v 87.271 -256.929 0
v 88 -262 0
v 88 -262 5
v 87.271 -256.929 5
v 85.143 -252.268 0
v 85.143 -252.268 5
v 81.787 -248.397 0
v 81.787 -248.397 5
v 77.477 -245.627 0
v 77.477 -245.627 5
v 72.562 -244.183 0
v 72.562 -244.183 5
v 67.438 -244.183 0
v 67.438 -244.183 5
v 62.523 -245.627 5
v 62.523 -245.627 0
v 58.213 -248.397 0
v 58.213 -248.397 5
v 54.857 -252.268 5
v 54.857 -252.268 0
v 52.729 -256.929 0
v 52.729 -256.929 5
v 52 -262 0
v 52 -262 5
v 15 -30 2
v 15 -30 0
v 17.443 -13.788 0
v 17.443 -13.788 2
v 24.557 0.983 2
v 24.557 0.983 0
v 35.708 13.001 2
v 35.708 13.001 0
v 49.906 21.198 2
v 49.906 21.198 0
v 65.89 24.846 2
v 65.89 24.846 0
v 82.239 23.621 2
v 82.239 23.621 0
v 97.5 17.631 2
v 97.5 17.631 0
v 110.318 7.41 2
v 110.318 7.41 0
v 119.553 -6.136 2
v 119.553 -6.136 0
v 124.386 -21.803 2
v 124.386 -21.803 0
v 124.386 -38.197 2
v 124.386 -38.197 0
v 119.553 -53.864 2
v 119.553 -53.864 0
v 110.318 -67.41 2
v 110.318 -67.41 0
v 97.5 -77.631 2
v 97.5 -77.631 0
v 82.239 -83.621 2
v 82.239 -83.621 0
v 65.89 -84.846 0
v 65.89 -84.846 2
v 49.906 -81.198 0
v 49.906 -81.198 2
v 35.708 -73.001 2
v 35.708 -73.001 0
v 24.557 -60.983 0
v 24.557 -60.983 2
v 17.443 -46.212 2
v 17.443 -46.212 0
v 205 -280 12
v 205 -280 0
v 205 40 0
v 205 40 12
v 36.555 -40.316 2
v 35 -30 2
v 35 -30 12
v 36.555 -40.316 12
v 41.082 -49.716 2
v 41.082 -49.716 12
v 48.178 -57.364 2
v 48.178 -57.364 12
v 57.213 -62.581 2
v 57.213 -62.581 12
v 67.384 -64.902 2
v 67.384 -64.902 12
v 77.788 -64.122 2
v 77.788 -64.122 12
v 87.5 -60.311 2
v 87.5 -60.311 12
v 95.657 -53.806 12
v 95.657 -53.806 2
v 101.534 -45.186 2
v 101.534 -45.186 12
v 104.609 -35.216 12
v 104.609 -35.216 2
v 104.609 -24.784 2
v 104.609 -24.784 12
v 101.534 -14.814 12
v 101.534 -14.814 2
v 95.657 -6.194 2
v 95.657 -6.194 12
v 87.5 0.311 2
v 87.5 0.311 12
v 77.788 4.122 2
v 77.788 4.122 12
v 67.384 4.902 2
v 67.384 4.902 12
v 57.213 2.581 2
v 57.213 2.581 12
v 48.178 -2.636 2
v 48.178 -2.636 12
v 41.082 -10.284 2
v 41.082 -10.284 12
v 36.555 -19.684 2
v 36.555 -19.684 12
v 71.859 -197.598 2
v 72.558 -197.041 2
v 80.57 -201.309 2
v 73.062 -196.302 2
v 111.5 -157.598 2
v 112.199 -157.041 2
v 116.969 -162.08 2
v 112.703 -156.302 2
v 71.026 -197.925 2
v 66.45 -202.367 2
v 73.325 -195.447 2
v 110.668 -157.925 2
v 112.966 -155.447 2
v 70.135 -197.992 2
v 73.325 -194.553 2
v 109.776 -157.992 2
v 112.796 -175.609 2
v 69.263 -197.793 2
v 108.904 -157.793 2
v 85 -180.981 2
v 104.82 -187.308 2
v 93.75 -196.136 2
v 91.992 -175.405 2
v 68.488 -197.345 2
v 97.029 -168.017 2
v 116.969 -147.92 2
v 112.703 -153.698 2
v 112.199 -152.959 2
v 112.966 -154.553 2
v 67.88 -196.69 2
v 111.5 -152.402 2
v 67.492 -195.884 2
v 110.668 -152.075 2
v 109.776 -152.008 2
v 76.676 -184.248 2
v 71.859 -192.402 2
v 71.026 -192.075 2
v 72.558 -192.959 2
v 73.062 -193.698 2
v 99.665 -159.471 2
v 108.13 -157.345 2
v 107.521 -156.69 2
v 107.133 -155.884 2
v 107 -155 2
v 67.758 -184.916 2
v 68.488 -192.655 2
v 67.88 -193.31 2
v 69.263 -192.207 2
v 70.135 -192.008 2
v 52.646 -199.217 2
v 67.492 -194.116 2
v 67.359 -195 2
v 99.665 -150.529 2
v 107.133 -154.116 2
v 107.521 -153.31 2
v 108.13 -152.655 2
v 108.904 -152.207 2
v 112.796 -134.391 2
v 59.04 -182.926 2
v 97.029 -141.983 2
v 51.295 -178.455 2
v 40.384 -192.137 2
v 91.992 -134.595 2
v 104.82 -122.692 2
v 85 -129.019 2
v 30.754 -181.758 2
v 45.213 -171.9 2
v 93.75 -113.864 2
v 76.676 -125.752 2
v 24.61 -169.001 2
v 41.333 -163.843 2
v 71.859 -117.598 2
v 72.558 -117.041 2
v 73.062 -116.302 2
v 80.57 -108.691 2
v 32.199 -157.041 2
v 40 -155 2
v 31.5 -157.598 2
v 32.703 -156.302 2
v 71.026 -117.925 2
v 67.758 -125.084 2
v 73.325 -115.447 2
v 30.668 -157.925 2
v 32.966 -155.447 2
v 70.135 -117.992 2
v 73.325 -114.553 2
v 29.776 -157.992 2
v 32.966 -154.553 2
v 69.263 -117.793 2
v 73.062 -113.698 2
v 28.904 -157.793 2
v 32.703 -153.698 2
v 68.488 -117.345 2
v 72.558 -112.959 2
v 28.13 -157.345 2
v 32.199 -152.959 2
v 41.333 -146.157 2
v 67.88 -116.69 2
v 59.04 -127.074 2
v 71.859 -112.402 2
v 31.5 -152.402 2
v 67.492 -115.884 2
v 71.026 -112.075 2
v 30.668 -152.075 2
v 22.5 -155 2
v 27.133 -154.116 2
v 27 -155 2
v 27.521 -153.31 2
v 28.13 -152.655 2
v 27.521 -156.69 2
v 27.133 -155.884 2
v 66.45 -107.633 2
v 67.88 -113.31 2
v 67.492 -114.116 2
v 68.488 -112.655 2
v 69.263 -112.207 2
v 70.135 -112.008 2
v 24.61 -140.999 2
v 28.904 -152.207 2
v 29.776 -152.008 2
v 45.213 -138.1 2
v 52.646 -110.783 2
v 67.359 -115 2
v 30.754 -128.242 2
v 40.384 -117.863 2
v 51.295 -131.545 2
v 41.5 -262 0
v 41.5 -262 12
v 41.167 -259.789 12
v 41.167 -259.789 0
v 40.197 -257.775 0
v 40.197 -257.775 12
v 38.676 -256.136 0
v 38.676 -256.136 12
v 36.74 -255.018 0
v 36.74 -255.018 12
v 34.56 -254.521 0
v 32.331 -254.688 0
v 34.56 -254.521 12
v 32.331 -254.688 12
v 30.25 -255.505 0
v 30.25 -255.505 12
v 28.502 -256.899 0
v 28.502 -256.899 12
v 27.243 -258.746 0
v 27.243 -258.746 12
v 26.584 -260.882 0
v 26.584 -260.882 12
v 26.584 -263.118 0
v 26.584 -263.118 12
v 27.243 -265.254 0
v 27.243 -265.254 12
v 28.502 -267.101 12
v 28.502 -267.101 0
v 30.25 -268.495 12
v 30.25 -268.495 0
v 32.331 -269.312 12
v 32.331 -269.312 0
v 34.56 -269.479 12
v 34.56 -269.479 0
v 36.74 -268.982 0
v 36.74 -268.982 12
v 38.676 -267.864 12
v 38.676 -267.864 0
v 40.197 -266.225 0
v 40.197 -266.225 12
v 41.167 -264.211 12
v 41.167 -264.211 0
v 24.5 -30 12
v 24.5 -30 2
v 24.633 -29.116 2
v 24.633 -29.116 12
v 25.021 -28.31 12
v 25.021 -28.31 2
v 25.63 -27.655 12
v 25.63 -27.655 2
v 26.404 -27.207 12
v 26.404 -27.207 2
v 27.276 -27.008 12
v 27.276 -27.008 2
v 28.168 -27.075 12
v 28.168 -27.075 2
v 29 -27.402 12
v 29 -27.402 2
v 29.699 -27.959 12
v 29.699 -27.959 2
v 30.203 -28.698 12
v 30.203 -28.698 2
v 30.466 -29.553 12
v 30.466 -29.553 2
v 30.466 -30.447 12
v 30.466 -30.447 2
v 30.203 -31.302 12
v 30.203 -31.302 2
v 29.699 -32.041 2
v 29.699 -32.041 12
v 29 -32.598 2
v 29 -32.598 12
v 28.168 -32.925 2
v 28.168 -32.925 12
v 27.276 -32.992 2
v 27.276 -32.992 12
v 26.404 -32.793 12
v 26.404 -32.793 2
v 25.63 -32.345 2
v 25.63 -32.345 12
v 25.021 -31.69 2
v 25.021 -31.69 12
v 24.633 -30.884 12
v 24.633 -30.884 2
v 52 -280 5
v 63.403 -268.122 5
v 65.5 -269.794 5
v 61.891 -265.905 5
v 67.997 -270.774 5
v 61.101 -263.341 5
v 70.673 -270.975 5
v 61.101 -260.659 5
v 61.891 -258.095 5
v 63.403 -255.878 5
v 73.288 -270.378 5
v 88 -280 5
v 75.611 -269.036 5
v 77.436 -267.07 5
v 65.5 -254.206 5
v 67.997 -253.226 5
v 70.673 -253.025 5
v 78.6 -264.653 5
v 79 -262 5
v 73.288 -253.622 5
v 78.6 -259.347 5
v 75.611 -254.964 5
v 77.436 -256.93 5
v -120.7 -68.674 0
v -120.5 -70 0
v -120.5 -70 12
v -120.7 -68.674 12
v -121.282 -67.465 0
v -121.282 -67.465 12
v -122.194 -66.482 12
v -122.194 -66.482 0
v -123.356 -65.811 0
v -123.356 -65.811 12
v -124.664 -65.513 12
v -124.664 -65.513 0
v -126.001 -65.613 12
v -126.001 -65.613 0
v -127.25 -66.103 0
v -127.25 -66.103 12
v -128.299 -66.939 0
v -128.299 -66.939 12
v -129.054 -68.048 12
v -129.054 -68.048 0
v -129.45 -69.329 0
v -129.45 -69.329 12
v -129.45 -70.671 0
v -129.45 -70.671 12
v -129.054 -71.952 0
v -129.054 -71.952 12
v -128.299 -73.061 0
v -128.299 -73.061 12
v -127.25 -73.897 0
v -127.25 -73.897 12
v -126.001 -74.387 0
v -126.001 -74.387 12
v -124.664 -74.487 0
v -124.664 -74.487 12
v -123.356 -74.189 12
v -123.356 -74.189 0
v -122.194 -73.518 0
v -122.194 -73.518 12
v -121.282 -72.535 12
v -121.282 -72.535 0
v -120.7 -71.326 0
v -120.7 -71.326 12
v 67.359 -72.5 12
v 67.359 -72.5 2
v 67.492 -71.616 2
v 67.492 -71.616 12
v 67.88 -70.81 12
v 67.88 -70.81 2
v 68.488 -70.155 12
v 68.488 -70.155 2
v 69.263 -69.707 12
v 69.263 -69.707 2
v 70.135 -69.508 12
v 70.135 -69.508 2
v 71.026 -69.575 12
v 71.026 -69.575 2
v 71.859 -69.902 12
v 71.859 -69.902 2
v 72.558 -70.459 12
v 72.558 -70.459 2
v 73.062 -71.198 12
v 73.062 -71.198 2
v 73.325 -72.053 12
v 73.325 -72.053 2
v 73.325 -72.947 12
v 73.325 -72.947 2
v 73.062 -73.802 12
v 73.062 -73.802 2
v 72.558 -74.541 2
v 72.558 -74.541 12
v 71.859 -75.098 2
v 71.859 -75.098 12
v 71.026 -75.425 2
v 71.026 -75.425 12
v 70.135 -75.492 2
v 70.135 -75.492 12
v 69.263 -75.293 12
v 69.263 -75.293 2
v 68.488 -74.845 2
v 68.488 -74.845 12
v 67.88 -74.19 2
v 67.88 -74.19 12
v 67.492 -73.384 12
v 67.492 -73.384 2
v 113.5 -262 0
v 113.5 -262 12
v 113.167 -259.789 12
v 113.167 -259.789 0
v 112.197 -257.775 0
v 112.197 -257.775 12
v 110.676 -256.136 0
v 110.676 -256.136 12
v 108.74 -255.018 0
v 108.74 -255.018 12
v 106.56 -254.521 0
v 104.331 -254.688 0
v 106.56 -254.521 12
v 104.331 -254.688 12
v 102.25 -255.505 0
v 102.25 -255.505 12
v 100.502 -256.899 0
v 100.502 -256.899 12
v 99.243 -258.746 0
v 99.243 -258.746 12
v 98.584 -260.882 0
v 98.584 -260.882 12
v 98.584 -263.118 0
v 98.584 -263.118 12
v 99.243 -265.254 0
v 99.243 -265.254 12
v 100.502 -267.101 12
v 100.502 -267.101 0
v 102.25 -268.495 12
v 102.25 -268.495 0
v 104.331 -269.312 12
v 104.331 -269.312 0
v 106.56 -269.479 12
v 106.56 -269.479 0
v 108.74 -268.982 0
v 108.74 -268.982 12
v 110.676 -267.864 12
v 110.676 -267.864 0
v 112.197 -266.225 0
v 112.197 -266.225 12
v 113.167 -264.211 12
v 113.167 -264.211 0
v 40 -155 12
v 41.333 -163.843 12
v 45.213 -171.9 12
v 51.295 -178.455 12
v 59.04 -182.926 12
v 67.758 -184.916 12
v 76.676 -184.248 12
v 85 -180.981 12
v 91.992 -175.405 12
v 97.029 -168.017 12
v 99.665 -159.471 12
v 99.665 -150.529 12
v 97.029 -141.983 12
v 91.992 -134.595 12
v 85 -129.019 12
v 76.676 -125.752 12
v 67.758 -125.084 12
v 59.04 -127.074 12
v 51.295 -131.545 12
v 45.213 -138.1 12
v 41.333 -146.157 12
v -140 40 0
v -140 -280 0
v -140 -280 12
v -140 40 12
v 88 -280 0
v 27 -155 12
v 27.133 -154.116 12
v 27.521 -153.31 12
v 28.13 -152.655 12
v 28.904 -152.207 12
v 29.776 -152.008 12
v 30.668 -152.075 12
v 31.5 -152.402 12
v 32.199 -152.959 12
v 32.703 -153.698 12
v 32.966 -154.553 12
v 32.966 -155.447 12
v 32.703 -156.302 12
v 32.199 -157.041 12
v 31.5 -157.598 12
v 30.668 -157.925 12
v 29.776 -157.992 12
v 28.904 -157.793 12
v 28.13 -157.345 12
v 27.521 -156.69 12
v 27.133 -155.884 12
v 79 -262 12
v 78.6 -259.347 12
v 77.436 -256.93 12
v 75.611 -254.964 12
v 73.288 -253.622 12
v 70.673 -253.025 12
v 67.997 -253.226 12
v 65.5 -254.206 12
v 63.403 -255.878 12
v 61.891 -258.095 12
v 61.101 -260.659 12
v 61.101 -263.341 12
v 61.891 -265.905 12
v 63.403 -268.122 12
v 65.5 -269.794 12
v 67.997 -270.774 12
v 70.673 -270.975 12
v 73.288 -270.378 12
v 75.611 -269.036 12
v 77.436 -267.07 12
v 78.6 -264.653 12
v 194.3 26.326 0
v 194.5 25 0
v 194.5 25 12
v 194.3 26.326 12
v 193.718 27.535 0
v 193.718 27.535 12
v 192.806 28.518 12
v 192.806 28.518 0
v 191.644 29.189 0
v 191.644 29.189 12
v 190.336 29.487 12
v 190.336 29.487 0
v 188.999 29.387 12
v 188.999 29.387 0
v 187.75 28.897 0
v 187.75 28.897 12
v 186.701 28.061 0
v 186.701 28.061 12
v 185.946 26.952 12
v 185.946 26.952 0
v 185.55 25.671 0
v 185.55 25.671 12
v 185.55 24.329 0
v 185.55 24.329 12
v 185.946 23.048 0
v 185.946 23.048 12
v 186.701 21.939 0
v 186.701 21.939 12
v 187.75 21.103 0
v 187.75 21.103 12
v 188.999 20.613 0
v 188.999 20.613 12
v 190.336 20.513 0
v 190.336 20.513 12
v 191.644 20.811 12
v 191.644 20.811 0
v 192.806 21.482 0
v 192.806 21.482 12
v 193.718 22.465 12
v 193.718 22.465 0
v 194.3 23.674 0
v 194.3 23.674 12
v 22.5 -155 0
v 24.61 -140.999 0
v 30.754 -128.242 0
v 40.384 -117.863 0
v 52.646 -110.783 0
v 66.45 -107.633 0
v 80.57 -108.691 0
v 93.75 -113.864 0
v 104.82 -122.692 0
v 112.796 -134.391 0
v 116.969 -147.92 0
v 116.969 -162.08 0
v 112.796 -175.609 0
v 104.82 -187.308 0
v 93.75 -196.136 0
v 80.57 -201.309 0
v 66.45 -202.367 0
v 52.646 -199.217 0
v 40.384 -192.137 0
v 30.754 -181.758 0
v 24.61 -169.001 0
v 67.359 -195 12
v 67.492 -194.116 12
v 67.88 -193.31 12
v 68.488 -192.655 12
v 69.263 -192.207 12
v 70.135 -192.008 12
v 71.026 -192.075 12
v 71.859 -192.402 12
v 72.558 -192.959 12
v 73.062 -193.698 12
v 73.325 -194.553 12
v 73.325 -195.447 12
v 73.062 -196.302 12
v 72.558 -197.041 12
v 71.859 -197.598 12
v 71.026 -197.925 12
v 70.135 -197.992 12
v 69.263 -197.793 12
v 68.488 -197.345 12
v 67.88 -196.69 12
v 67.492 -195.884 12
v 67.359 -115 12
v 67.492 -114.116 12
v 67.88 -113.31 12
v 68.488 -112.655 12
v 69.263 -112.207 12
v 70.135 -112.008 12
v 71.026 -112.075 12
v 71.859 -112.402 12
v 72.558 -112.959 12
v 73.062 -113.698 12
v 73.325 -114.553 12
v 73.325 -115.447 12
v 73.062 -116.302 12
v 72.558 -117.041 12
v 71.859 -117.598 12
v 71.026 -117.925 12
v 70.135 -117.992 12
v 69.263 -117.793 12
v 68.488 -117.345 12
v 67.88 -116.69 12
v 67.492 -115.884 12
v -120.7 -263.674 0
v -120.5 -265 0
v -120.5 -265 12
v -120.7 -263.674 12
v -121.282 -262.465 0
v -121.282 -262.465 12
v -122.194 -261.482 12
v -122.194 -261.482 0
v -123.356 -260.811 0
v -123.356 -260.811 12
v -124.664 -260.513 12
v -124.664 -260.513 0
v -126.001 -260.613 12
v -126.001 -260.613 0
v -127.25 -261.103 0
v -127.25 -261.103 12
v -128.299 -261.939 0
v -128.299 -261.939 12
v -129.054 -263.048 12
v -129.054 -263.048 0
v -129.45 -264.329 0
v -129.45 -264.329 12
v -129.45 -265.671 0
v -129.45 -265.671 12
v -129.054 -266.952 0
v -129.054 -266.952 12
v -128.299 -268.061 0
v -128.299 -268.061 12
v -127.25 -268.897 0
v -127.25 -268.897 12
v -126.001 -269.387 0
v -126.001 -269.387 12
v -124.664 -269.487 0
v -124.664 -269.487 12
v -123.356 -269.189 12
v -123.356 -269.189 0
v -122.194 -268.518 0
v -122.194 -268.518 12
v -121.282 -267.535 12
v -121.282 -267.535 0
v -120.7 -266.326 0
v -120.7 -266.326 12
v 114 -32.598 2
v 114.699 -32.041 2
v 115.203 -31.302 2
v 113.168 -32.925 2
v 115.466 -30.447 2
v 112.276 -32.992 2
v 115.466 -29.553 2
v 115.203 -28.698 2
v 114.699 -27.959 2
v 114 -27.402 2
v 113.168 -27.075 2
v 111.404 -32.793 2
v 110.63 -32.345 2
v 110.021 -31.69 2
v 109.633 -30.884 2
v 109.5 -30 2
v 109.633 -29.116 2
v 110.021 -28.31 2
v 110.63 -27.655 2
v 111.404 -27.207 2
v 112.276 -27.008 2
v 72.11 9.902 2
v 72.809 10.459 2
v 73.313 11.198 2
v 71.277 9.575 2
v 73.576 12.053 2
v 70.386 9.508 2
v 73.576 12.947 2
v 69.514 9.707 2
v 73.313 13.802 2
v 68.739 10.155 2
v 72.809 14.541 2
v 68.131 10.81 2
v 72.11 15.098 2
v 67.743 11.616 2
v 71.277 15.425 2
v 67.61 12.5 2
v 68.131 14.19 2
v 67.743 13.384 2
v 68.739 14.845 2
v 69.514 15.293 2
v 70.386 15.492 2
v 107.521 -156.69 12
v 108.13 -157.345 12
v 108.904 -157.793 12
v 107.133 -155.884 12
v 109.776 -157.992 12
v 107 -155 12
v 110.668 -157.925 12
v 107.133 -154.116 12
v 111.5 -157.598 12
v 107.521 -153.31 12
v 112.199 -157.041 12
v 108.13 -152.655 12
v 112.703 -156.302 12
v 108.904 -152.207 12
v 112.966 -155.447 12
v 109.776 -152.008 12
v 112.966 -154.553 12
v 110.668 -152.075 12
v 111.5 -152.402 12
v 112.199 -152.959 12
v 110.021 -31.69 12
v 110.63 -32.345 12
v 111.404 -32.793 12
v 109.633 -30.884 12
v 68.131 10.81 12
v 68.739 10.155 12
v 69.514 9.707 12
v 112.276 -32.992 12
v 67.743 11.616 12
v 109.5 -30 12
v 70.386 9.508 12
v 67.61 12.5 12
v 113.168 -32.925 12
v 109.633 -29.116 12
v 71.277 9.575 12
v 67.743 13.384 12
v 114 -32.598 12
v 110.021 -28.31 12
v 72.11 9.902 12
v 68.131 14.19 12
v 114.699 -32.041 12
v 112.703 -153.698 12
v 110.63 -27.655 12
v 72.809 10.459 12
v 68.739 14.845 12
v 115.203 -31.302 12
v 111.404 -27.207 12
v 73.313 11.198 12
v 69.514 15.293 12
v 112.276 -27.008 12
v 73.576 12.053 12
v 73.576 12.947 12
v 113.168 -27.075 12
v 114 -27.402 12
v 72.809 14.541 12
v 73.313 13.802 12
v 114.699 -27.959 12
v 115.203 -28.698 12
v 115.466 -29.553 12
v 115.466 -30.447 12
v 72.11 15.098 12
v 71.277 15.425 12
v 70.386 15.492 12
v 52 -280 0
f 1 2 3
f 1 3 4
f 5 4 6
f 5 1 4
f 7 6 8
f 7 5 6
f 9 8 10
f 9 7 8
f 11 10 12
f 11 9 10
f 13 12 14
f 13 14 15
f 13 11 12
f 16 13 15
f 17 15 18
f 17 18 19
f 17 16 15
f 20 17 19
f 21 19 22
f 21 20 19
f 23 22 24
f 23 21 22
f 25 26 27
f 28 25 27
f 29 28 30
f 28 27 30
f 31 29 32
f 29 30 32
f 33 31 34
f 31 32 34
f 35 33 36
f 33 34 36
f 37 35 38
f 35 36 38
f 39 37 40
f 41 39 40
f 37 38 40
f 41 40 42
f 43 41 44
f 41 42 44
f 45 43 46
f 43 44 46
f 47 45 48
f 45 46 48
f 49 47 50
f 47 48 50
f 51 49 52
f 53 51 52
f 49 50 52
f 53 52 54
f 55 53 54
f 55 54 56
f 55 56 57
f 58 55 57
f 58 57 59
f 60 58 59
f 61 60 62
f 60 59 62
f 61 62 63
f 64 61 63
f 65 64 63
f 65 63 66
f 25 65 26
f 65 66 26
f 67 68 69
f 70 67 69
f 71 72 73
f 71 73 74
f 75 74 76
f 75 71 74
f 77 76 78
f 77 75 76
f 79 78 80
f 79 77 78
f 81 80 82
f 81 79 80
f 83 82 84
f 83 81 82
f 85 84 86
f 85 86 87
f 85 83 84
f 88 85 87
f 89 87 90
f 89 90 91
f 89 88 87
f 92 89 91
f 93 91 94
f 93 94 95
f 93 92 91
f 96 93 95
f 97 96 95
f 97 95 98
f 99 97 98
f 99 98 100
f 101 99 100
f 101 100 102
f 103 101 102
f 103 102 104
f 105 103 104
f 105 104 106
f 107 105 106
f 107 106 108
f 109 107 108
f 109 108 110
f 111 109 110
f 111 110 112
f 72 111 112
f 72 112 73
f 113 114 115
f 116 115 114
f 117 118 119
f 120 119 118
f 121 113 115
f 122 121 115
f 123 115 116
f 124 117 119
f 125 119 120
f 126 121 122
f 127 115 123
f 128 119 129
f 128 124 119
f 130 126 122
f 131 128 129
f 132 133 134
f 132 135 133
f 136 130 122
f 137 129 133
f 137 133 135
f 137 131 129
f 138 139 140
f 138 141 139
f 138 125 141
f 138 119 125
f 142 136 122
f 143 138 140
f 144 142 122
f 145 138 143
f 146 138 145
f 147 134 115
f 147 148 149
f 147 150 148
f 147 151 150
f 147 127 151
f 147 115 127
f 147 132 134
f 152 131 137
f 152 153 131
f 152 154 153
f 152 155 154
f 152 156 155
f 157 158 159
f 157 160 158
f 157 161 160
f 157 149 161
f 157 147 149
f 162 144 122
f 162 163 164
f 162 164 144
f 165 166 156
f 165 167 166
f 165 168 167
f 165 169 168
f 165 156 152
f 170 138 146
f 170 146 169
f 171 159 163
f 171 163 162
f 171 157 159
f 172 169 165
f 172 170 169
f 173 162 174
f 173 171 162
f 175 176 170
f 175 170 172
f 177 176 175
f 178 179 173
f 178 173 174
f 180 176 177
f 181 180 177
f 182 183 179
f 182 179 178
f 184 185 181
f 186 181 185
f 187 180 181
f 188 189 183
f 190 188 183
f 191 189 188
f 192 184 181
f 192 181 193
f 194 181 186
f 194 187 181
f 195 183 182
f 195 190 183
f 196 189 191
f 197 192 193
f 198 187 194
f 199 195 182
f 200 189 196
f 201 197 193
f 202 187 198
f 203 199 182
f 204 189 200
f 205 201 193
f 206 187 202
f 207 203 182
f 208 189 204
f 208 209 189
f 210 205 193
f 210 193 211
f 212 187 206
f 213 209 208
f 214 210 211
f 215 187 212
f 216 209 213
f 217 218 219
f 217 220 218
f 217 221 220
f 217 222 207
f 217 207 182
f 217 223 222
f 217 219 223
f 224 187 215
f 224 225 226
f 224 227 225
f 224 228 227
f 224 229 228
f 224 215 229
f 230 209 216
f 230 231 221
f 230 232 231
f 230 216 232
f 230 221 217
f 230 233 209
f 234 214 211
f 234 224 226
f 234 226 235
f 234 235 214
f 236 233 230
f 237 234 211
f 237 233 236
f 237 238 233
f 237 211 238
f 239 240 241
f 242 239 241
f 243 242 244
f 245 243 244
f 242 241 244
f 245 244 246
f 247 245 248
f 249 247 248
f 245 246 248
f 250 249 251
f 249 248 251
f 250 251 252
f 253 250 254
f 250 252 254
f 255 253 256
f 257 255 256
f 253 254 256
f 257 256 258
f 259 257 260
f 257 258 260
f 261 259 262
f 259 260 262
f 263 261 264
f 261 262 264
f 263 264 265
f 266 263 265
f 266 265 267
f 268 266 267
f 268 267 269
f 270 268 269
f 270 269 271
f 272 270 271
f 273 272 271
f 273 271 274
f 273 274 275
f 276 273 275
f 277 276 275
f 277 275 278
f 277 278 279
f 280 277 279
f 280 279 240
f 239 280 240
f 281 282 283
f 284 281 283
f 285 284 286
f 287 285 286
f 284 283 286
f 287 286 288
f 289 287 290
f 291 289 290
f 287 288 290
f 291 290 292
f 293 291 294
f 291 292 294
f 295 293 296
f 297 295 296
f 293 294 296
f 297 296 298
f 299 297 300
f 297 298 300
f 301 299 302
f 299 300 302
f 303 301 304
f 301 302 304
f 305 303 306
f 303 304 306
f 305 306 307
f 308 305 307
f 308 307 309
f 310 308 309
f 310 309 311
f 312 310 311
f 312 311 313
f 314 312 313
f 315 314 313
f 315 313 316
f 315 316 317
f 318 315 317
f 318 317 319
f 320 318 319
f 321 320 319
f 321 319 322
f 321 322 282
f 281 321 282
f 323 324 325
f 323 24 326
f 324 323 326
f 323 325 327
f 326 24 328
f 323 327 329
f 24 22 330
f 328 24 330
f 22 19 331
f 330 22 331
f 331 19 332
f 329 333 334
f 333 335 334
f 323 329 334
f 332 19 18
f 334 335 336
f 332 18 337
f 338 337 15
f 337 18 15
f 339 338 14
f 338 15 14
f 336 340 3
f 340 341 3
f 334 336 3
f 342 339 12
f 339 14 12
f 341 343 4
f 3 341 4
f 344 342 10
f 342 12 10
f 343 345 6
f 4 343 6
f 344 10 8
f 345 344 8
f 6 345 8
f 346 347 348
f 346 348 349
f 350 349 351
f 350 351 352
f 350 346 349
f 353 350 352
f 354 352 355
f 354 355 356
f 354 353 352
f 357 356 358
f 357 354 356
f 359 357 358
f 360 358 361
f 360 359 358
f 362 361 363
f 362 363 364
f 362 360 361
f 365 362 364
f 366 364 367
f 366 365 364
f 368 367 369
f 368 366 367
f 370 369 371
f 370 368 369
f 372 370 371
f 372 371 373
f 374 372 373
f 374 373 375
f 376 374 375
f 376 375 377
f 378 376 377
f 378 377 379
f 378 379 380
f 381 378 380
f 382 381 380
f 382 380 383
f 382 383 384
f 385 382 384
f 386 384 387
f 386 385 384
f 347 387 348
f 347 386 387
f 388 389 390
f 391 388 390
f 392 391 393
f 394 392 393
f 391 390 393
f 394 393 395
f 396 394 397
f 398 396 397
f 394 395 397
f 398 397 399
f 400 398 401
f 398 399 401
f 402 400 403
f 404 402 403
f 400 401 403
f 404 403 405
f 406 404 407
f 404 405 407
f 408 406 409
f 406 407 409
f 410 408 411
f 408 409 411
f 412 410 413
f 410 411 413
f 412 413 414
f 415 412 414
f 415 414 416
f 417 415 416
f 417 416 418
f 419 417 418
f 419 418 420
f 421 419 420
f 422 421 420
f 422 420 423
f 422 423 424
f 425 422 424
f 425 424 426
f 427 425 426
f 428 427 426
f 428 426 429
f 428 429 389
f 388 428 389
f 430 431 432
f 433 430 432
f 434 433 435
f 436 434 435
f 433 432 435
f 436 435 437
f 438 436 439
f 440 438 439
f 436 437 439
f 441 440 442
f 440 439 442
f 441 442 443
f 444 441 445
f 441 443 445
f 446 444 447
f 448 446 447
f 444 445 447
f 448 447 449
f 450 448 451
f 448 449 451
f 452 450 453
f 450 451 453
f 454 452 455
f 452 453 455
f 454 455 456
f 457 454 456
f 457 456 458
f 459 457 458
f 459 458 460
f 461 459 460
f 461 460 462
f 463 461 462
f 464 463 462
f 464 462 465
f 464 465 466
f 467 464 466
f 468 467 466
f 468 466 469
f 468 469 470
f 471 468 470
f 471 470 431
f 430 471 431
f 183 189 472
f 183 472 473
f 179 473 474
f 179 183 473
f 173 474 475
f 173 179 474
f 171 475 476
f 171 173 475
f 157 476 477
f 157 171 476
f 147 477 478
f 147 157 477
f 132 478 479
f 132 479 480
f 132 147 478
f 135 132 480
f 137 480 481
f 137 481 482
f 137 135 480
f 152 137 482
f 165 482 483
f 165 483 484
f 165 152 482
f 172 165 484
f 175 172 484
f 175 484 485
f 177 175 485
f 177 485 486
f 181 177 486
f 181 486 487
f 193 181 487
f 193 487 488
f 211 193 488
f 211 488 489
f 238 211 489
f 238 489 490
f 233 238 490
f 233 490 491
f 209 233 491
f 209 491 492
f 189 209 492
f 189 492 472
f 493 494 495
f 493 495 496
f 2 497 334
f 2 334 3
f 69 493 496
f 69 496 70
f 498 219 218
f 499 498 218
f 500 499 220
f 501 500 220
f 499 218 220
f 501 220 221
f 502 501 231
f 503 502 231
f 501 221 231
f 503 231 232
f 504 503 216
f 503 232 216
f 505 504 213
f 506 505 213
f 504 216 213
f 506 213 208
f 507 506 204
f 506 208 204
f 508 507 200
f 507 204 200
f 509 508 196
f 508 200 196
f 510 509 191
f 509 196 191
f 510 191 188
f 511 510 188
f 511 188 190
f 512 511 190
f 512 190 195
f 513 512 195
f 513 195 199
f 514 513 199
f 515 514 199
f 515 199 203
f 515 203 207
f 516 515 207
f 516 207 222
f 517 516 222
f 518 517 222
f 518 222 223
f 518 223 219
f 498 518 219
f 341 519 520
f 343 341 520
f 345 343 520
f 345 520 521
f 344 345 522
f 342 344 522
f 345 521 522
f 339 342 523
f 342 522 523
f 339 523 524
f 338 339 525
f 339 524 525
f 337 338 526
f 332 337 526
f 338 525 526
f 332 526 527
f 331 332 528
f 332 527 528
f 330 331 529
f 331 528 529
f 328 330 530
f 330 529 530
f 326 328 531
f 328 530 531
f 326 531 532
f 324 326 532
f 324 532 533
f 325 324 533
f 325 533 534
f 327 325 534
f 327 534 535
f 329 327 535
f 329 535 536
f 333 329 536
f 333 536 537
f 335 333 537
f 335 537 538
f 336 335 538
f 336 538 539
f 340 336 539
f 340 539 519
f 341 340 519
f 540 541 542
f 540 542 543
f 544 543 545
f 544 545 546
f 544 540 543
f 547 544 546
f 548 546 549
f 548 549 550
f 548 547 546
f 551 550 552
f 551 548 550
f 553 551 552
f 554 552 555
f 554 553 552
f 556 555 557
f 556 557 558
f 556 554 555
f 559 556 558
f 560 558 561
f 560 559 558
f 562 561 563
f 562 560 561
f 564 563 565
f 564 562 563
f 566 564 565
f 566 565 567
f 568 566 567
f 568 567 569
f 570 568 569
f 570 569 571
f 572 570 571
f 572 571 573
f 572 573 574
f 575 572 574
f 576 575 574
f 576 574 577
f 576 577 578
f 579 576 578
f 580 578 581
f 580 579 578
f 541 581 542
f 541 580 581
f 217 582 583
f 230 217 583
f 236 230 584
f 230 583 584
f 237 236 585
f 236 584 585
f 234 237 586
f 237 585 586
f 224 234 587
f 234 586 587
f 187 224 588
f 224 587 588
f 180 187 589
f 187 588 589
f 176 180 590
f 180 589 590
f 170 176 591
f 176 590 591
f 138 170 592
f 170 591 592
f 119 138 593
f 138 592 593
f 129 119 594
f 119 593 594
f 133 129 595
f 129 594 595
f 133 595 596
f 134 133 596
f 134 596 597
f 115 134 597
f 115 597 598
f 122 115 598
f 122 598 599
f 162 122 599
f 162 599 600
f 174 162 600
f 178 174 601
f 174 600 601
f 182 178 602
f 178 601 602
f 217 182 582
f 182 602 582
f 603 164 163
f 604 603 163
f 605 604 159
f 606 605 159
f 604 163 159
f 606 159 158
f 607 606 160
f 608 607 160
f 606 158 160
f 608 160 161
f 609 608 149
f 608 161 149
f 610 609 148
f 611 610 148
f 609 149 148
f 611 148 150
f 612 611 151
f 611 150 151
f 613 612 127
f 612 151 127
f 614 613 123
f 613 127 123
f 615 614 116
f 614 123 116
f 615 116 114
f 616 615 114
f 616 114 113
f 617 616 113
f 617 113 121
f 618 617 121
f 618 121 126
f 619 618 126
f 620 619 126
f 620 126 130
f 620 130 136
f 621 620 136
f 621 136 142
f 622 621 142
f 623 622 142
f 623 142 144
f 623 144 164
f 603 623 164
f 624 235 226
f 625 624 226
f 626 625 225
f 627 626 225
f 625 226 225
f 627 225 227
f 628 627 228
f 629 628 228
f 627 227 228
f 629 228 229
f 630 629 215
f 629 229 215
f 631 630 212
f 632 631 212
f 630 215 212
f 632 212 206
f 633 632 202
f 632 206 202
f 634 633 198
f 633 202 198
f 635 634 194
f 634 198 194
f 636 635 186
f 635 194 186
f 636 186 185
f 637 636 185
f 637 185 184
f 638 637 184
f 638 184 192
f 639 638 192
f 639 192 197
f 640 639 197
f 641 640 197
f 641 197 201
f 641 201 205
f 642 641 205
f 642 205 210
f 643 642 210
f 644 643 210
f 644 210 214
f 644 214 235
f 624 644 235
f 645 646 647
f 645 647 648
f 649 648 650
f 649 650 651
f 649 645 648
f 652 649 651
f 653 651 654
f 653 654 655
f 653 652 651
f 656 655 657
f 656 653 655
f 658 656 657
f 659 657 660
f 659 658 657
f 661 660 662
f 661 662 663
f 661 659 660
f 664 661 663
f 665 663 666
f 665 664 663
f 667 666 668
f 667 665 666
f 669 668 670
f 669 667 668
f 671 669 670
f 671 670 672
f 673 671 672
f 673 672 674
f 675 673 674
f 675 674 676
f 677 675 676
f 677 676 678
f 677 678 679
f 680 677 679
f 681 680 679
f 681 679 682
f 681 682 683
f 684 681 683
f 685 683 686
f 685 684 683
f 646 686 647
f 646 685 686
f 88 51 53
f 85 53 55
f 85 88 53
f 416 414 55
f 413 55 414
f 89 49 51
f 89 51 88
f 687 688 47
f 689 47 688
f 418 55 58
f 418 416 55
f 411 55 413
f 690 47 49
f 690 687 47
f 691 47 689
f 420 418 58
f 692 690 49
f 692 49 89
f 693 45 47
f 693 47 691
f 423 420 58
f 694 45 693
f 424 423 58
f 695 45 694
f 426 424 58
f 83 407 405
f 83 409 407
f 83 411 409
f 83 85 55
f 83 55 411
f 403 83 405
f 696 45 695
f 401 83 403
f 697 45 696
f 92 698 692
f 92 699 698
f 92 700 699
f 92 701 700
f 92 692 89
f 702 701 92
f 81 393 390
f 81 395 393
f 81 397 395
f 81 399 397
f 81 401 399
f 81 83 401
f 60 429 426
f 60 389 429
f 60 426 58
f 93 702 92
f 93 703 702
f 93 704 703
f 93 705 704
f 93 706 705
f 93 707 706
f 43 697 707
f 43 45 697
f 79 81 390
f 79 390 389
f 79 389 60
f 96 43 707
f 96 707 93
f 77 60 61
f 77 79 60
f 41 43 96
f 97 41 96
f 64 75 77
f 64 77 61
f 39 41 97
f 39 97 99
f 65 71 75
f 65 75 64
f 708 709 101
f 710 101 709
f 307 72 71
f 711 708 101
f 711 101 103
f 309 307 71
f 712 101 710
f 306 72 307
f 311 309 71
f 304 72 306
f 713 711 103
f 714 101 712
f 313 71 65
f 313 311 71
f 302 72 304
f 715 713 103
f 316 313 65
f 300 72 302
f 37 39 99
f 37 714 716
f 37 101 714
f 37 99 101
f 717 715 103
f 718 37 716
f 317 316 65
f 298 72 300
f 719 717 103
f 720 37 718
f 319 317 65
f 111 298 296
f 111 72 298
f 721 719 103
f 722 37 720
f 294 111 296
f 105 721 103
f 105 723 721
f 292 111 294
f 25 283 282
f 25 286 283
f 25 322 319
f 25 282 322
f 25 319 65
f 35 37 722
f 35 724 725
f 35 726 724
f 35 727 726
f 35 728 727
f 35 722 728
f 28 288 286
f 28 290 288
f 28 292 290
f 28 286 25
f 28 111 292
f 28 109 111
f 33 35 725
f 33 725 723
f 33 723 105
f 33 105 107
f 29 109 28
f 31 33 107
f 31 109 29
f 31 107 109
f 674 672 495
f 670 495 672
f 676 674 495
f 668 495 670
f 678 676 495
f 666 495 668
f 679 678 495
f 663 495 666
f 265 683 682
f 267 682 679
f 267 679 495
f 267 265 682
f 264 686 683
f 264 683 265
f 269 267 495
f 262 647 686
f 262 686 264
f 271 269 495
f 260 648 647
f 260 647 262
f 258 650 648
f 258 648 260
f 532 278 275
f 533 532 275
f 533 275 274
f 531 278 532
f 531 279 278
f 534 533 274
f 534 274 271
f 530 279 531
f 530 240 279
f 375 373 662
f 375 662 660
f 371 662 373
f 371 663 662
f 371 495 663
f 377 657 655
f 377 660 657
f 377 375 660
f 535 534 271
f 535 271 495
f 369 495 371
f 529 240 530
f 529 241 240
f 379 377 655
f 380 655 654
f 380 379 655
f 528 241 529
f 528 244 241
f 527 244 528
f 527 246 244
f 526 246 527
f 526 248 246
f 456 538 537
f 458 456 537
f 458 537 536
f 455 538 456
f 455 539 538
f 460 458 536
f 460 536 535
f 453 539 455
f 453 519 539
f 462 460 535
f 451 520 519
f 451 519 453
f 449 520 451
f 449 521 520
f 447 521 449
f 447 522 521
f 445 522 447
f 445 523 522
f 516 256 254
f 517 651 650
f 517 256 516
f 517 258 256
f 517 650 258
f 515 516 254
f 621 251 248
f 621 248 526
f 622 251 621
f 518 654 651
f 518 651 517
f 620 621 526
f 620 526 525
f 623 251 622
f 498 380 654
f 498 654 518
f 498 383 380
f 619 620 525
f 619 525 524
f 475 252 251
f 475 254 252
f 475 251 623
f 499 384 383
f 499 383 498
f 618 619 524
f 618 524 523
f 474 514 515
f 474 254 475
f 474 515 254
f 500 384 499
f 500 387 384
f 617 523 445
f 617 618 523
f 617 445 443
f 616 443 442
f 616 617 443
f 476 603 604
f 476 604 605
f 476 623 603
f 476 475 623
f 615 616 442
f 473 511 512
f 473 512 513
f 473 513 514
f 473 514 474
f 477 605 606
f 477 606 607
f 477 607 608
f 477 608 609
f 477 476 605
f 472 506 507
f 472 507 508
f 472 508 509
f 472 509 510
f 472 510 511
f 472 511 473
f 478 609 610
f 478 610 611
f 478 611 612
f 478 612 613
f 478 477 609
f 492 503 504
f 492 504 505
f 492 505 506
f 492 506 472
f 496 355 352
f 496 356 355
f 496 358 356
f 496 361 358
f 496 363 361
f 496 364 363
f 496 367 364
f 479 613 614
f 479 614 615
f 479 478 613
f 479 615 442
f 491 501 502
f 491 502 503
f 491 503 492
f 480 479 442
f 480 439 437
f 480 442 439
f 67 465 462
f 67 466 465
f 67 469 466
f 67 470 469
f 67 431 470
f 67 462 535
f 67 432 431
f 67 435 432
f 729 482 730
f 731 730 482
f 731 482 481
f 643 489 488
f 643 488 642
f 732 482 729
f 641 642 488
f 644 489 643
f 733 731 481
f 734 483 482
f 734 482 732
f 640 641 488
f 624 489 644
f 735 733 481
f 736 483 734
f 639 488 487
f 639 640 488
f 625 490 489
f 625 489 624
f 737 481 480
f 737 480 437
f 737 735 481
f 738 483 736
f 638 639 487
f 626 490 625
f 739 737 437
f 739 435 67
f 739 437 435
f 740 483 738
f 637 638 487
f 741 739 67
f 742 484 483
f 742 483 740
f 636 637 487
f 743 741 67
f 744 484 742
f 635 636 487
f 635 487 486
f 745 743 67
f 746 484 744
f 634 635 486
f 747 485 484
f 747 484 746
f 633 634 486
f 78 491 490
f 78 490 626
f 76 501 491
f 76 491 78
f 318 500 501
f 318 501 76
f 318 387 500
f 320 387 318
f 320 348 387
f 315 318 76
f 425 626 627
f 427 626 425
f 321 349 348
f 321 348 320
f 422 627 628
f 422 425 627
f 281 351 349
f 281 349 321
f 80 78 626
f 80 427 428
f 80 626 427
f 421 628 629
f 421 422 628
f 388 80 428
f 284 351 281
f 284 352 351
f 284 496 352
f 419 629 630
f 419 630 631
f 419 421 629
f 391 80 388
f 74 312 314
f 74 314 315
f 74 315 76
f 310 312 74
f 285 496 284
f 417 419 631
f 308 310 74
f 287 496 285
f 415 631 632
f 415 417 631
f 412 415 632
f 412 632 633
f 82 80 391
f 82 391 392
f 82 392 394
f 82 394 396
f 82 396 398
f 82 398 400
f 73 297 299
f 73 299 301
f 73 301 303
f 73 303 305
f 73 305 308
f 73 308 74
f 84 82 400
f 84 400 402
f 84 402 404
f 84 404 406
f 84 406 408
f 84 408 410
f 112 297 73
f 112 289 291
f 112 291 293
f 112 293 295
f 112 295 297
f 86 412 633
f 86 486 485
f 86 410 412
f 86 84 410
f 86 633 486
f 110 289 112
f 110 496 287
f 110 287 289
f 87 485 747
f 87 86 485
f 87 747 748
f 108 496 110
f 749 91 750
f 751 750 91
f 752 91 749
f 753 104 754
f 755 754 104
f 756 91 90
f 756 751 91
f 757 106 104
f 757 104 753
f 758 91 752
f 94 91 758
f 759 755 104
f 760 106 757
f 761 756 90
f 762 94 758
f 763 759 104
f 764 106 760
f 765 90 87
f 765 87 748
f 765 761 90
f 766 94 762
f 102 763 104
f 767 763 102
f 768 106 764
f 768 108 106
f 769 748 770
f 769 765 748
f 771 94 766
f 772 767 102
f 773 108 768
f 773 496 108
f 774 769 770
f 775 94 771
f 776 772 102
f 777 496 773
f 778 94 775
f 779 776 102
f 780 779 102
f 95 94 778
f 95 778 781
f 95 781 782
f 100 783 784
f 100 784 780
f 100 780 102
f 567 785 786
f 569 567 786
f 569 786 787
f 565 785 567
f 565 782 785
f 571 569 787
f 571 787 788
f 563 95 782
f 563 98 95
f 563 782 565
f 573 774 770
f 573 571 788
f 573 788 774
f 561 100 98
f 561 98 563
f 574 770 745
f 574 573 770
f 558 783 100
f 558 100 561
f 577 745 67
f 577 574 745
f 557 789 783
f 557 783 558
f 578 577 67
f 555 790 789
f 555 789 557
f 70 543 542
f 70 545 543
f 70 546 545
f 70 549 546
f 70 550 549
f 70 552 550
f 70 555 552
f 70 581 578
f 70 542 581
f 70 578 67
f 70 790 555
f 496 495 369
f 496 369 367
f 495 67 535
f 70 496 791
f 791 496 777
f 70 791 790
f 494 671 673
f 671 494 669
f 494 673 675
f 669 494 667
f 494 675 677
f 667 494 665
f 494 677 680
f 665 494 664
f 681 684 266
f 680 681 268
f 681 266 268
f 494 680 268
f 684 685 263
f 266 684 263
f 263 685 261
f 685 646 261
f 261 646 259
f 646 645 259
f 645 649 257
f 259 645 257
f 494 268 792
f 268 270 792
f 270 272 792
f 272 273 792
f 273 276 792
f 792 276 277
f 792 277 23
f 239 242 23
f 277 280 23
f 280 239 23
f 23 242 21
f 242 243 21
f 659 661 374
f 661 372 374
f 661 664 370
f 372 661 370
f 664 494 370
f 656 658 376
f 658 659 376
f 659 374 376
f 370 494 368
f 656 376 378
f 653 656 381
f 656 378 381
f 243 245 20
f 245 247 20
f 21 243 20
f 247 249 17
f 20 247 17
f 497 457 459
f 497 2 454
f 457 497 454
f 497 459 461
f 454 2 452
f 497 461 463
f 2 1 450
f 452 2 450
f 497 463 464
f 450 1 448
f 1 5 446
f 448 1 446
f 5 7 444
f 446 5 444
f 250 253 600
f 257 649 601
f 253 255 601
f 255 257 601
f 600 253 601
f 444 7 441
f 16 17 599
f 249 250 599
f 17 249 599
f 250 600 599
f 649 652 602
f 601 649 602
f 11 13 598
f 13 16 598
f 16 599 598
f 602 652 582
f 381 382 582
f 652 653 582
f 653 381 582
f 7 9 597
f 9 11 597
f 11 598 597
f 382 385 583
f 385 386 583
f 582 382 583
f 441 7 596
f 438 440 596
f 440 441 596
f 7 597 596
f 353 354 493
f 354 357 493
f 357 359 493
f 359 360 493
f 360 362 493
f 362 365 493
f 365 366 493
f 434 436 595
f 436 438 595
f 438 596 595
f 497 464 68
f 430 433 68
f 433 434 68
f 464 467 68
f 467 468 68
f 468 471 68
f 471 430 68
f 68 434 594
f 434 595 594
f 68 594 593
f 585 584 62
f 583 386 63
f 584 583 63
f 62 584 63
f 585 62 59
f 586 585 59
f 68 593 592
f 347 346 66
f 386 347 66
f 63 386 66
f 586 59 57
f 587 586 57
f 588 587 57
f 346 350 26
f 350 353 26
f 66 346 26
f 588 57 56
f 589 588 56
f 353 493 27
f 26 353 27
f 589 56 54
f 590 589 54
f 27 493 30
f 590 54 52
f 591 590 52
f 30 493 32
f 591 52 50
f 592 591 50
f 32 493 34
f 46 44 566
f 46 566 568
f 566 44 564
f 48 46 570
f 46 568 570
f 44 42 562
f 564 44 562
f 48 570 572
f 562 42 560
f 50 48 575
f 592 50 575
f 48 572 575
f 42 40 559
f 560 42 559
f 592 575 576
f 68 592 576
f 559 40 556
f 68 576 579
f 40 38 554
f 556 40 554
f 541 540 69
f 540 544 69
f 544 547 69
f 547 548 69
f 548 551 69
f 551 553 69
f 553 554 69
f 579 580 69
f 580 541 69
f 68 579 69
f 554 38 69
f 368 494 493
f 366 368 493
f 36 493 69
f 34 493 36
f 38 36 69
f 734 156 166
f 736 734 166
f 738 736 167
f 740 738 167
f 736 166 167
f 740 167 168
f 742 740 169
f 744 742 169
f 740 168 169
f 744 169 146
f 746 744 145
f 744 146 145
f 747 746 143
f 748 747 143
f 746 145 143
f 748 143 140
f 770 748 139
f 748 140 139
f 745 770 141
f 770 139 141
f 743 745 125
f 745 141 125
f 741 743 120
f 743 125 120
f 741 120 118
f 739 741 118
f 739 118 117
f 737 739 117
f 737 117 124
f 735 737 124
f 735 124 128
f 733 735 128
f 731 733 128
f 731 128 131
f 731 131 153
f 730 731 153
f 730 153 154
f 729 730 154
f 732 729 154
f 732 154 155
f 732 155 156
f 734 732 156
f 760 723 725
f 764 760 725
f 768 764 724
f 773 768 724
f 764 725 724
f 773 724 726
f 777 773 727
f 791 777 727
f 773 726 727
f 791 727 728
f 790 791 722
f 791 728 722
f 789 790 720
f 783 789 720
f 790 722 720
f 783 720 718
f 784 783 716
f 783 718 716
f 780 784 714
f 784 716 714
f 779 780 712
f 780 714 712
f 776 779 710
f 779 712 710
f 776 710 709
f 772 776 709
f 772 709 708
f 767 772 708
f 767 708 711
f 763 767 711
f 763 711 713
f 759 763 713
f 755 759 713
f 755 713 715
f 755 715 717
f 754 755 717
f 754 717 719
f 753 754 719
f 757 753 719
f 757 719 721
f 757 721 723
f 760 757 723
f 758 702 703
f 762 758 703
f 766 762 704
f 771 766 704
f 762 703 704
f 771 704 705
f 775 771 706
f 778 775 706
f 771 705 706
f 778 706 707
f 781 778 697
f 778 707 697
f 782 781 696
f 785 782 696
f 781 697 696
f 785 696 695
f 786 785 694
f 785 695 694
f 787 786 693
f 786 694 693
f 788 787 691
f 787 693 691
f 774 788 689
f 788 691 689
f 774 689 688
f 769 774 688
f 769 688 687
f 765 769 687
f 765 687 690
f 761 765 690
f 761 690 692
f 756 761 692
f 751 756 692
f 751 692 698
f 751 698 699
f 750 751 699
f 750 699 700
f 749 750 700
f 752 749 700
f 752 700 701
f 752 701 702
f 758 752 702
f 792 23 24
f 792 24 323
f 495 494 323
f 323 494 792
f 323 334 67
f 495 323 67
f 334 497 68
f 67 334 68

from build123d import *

# Parameters (mm, degrees)
ESQUISSE1_W             = 345
ESQUISSE1_H             = 320
ESQUISSE1_R             = 4.5
ESQUISSE1_R_2           = 30
ESQUISSE1_R_3           = 35
BASE_EXTRUSION_DEPTH    = 12
ESQUISSE2_R             = 55
ESQUISSE2_R_2           = 47.5
ENL_V_MAT_EXTRU_1_DEPTH = 2
PER_AGE3_D              = 6
ESQUISSE8_R             = 9
ESQUISSE8_R_2           = 7.5
ENL_V_MAT_EXTRU_2_DEPTH = 348.230471013
ENL_V_MAT_EXTRU_3_DEPTH = 5


with BuildPart() as part:
    # Esquisse1 → Base-Extrusion (new body)
    with BuildSketch(Plane.XY):
        with Locations((32.5, -120)):
            Rectangle(ESQUISSE1_W, ESQUISSE1_H)
        with Locations((190, 25)):
            Circle(ESQUISSE1_R, mode=Mode.SUBTRACT)
        with Locations((-125, -265)):
            Circle(ESQUISSE1_R, mode=Mode.SUBTRACT)
        with Locations(Location((70, -155, 0), (0, 0, 180))):
            Circle(ESQUISSE1_R_2, mode=Mode.SUBTRACT)
        with Locations(Location((70, -30, 0), (0, 0, 180))):
            Circle(ESQUISSE1_R_3, mode=Mode.SUBTRACT)
        with Locations((-125, -70)):
            Circle(ESQUISSE1_R, mode=Mode.SUBTRACT)
    extrude(amount=BASE_EXTRUSION_DEPTH)

    # Esquisse2 → Enlèv. mat.-Extru.1 (cut)
    with BuildSketch(Plane(origin=(0, 0, 0), x_dir=(-1, 0, 0), z_dir=(0, 0, -1))):
        with Locations((-70, -30)):
            Circle(ESQUISSE2_R)
        with Locations((-70, -155)):
            Circle(ESQUISSE2_R_2)
    extrude(amount=-ENL_V_MAT_EXTRU_1_DEPTH, mode=Mode.SUBTRACT)

    # Perçage3 (through all)
    with Locations(Plane.XY.offset(12)):
        with Locations((70.60973448, 12.5), (70.358898569, -72.5), (112.5, -30), (27.5, -30), (110, -155), (70.358898569, -195), (30, -155), (70.358898569, -115)):
            Hole(PER_AGE3_D / 2)

    # Esquisse8 → Enlèv. mat.-Extru.2 (cut, through all)
    with BuildSketch(Plane.XY.offset(12)):
        with Locations((70, -262)):
            Circle(ESQUISSE8_R)
        with Locations((34, -262)):
            Circle(ESQUISSE8_R_2)
        with Locations((106, -262)):
            Circle(ESQUISSE8_R_2)
    extrude(amount=-ENL_V_MAT_EXTRU_2_DEPTH, mode=Mode.SUBTRACT)

    # Esquisse9 → Enlèv. mat.-Extru.3 (cut)
    with BuildSketch(Plane(origin=(0, 0, 0), x_dir=(-1, 0, 0), z_dir=(0, 0, -1))):
        with BuildLine():
            Line((-52, -262), (-52, -280))
            Line((-52, -280), (-88, -280))
            Line((-88, -280), (-88, -262))
            ThreePointArc((-88, -262), (-70, -244), (-52, -262))
        make_face()
    extrude(amount=-ENL_V_MAT_EXTRU_3_DEPTH, mode=Mode.SUBTRACT)


solid = part.part
